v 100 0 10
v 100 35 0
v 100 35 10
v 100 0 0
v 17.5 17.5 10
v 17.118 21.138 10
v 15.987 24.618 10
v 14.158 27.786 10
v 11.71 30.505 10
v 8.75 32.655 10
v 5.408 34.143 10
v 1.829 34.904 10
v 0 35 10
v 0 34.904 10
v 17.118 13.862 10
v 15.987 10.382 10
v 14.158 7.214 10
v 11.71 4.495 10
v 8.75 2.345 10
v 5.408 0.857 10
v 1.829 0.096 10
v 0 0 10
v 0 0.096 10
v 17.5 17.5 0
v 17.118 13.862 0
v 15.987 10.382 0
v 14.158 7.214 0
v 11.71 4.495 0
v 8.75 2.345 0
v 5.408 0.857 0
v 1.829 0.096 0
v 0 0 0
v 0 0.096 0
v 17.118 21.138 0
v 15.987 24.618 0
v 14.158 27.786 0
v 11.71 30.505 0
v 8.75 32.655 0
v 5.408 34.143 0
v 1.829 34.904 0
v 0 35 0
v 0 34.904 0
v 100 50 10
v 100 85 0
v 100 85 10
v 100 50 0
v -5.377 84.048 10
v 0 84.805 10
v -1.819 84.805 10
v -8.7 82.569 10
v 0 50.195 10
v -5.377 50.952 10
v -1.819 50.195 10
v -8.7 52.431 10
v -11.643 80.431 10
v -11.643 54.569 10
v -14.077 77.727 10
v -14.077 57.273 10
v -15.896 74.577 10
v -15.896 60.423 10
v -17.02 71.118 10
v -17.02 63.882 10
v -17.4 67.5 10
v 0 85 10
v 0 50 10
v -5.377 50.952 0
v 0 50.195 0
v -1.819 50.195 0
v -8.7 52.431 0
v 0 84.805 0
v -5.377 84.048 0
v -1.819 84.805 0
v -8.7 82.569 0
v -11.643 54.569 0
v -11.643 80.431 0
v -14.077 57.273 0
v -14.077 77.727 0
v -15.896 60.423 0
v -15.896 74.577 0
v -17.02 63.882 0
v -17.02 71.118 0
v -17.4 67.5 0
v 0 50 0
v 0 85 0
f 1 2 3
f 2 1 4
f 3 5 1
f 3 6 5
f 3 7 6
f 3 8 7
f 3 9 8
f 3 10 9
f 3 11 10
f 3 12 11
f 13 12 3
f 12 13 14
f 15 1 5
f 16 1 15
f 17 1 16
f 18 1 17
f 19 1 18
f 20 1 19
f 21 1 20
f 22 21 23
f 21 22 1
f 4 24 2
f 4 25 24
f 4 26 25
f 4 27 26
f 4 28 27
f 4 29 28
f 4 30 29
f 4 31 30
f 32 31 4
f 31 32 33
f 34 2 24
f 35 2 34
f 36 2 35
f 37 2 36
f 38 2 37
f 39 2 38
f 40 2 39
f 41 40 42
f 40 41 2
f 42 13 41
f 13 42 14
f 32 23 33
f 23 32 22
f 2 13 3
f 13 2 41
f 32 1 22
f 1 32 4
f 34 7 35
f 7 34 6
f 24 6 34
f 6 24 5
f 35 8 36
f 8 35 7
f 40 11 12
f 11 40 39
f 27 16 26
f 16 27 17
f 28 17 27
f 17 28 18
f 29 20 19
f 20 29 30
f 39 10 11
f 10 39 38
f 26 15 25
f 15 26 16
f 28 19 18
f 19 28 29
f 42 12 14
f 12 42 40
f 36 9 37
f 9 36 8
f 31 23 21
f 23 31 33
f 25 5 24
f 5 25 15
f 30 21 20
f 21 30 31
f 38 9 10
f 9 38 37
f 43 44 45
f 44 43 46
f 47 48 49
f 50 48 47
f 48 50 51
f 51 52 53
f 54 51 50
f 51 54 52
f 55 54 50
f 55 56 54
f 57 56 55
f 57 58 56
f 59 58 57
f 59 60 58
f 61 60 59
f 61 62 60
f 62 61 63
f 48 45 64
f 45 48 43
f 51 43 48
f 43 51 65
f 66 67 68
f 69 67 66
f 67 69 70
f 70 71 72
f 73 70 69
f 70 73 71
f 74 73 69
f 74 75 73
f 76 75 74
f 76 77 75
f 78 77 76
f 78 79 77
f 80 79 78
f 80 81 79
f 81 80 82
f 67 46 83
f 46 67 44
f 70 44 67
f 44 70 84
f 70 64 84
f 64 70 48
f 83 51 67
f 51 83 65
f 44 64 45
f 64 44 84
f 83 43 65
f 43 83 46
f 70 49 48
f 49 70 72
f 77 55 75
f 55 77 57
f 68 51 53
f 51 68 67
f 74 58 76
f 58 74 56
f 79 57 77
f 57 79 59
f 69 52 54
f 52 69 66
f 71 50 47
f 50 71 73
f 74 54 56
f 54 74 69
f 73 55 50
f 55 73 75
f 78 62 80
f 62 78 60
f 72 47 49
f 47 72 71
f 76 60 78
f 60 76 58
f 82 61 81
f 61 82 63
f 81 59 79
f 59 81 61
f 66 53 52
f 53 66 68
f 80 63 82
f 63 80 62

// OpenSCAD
difference (){
cube ([100,35,10]);
translate ([0,17.5,-1])cylinder (12,17.5,17.5);
}

translate ([0,50,0]){
cube ([100,35,10]);
translate ([0,17.5,-0])cylinder (10,17.4,17.4);
}
